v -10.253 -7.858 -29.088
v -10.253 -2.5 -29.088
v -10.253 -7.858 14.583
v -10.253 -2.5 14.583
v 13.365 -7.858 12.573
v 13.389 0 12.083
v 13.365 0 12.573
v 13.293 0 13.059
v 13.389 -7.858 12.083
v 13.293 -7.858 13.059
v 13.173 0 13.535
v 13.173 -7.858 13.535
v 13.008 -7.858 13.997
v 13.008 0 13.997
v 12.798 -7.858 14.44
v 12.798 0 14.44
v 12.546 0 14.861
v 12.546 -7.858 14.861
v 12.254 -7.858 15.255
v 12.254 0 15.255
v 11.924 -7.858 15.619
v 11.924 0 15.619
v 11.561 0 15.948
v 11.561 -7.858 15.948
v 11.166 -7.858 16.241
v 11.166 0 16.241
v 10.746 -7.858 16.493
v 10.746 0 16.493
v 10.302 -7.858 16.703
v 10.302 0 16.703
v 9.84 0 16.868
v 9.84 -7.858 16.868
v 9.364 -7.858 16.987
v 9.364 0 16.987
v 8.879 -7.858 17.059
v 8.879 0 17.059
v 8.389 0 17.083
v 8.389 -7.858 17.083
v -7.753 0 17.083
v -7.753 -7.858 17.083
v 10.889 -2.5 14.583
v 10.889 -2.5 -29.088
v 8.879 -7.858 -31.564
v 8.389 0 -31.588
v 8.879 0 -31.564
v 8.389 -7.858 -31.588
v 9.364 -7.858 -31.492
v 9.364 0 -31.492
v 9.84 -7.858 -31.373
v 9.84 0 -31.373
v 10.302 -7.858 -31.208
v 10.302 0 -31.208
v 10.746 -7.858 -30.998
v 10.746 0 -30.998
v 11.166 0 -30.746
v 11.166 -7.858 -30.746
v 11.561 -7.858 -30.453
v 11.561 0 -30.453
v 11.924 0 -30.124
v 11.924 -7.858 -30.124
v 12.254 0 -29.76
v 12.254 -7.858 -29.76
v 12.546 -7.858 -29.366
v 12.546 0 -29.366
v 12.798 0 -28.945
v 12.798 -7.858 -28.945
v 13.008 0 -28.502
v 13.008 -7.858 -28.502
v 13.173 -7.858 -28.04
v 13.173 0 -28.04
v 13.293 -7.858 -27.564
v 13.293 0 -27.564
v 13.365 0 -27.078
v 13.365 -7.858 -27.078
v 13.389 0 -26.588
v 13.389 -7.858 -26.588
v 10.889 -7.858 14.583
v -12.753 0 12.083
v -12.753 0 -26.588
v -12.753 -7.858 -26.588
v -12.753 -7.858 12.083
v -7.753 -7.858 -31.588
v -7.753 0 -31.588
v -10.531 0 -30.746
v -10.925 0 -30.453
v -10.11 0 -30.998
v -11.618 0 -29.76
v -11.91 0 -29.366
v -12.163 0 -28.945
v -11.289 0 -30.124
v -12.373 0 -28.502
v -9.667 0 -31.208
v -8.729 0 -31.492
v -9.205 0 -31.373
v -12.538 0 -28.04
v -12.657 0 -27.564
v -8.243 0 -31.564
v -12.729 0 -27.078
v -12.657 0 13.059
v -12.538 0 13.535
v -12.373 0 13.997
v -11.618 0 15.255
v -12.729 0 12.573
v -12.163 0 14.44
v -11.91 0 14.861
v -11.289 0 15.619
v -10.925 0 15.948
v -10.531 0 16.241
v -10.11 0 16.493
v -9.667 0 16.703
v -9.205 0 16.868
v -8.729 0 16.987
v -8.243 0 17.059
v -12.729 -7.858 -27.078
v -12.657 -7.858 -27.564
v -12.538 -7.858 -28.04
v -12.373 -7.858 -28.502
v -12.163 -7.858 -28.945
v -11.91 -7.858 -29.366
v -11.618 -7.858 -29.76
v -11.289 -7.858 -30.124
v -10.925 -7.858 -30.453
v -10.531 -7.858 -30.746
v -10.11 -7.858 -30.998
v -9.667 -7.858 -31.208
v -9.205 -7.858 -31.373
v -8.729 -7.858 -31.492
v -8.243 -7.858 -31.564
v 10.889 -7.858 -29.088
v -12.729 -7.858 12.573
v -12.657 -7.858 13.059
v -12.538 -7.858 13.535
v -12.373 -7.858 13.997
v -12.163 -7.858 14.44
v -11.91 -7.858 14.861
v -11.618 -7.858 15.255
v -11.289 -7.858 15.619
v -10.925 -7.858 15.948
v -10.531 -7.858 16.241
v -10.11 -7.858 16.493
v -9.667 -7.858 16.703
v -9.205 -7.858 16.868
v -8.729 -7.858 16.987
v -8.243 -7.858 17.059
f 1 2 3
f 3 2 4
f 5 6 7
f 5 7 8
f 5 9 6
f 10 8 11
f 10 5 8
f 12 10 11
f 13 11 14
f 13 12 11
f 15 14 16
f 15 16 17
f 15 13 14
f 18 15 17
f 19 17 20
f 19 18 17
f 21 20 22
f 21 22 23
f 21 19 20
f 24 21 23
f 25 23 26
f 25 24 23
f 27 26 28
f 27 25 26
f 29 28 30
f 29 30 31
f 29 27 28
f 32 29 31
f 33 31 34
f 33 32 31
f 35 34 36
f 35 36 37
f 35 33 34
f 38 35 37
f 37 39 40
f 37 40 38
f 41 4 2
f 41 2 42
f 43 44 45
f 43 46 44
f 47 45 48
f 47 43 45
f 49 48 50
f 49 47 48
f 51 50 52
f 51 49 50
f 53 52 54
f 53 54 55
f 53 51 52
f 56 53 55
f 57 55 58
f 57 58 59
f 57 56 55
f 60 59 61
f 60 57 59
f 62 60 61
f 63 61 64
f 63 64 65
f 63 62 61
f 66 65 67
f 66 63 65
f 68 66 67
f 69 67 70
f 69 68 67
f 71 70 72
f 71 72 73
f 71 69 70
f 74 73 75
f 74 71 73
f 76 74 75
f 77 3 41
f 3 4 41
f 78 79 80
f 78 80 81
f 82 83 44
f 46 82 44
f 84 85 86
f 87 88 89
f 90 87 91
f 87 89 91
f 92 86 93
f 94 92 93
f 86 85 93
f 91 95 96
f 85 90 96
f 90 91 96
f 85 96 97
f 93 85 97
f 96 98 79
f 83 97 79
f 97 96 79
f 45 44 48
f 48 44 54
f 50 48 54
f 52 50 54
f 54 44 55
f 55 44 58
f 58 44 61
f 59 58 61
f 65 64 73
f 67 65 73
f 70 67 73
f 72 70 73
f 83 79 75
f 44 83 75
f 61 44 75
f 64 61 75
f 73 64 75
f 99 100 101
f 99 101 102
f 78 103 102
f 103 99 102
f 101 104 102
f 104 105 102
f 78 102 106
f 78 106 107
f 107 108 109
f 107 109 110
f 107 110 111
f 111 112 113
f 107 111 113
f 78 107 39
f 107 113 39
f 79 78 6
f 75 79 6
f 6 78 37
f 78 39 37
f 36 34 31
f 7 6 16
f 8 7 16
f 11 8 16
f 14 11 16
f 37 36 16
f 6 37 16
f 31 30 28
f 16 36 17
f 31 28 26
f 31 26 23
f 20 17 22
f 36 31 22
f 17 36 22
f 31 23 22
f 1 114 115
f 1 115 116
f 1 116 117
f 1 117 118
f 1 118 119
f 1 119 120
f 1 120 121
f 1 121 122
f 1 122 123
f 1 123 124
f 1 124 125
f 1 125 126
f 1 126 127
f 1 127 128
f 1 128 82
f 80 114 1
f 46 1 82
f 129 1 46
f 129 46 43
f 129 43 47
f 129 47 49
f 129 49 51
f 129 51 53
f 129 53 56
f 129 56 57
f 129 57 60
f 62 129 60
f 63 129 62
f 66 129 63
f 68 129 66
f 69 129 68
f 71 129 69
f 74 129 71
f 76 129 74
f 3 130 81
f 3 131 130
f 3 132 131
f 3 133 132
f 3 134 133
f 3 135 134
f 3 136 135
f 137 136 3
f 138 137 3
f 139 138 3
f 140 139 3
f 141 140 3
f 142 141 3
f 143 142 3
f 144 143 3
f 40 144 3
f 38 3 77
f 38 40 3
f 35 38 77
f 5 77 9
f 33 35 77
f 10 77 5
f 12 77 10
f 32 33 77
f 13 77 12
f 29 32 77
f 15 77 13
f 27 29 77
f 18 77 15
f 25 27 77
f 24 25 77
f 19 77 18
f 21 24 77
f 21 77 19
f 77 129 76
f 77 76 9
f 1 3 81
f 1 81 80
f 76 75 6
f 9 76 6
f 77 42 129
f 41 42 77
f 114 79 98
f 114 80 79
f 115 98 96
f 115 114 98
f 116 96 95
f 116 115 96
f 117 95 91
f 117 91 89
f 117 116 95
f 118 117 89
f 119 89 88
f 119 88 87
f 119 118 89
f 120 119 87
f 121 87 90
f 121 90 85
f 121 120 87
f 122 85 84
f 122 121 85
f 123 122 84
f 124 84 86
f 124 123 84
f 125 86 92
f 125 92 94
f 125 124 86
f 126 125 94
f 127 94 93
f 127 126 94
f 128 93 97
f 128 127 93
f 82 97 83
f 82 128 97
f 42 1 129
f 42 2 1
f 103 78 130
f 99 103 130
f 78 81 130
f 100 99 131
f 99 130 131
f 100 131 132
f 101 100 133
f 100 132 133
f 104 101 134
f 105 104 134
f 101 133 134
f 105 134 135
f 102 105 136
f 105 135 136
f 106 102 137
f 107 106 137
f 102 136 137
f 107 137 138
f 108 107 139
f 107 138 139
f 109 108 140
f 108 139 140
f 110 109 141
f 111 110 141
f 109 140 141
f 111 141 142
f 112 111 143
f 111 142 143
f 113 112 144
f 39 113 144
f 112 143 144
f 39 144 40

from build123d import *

# Parameters (mm, degrees)
F0_W     = 26.141723
F0_H     = 48.671415
F1_DEPTH = 7.857718
F2_T     = -2.5
F3_R     = 5


with BuildPart() as f1:
    # F0 (on Front) → F1 (new body)
    with BuildSketch(Plane.XZ):
        with Locations((0.317732, -7.252515)):
            Rectangle(F0_W, F0_H)
    extrude(amount=F1_DEPTH)

    # F2
    f2_openings = [f1.faces().sort_by_distance(p)[0] for p in [
        (0.317732, -7.857718, -7.252515),
    ]]
    offset(amount=F2_T, openings=f2_openings)

    # F3
    f3_edges = [f1.edges().sort_by_distance(p)[0] for p in [
        (13.388594, -3.928859, 17.083192),
        (-12.753129, -3.928859, 17.083192),
        (-12.753129, -3.928859, -31.588223),
        (13.388594, -3.928859, -31.588223),
    ]]
    fillet(f3_edges, radius=F3_R)


solid = f1.part
